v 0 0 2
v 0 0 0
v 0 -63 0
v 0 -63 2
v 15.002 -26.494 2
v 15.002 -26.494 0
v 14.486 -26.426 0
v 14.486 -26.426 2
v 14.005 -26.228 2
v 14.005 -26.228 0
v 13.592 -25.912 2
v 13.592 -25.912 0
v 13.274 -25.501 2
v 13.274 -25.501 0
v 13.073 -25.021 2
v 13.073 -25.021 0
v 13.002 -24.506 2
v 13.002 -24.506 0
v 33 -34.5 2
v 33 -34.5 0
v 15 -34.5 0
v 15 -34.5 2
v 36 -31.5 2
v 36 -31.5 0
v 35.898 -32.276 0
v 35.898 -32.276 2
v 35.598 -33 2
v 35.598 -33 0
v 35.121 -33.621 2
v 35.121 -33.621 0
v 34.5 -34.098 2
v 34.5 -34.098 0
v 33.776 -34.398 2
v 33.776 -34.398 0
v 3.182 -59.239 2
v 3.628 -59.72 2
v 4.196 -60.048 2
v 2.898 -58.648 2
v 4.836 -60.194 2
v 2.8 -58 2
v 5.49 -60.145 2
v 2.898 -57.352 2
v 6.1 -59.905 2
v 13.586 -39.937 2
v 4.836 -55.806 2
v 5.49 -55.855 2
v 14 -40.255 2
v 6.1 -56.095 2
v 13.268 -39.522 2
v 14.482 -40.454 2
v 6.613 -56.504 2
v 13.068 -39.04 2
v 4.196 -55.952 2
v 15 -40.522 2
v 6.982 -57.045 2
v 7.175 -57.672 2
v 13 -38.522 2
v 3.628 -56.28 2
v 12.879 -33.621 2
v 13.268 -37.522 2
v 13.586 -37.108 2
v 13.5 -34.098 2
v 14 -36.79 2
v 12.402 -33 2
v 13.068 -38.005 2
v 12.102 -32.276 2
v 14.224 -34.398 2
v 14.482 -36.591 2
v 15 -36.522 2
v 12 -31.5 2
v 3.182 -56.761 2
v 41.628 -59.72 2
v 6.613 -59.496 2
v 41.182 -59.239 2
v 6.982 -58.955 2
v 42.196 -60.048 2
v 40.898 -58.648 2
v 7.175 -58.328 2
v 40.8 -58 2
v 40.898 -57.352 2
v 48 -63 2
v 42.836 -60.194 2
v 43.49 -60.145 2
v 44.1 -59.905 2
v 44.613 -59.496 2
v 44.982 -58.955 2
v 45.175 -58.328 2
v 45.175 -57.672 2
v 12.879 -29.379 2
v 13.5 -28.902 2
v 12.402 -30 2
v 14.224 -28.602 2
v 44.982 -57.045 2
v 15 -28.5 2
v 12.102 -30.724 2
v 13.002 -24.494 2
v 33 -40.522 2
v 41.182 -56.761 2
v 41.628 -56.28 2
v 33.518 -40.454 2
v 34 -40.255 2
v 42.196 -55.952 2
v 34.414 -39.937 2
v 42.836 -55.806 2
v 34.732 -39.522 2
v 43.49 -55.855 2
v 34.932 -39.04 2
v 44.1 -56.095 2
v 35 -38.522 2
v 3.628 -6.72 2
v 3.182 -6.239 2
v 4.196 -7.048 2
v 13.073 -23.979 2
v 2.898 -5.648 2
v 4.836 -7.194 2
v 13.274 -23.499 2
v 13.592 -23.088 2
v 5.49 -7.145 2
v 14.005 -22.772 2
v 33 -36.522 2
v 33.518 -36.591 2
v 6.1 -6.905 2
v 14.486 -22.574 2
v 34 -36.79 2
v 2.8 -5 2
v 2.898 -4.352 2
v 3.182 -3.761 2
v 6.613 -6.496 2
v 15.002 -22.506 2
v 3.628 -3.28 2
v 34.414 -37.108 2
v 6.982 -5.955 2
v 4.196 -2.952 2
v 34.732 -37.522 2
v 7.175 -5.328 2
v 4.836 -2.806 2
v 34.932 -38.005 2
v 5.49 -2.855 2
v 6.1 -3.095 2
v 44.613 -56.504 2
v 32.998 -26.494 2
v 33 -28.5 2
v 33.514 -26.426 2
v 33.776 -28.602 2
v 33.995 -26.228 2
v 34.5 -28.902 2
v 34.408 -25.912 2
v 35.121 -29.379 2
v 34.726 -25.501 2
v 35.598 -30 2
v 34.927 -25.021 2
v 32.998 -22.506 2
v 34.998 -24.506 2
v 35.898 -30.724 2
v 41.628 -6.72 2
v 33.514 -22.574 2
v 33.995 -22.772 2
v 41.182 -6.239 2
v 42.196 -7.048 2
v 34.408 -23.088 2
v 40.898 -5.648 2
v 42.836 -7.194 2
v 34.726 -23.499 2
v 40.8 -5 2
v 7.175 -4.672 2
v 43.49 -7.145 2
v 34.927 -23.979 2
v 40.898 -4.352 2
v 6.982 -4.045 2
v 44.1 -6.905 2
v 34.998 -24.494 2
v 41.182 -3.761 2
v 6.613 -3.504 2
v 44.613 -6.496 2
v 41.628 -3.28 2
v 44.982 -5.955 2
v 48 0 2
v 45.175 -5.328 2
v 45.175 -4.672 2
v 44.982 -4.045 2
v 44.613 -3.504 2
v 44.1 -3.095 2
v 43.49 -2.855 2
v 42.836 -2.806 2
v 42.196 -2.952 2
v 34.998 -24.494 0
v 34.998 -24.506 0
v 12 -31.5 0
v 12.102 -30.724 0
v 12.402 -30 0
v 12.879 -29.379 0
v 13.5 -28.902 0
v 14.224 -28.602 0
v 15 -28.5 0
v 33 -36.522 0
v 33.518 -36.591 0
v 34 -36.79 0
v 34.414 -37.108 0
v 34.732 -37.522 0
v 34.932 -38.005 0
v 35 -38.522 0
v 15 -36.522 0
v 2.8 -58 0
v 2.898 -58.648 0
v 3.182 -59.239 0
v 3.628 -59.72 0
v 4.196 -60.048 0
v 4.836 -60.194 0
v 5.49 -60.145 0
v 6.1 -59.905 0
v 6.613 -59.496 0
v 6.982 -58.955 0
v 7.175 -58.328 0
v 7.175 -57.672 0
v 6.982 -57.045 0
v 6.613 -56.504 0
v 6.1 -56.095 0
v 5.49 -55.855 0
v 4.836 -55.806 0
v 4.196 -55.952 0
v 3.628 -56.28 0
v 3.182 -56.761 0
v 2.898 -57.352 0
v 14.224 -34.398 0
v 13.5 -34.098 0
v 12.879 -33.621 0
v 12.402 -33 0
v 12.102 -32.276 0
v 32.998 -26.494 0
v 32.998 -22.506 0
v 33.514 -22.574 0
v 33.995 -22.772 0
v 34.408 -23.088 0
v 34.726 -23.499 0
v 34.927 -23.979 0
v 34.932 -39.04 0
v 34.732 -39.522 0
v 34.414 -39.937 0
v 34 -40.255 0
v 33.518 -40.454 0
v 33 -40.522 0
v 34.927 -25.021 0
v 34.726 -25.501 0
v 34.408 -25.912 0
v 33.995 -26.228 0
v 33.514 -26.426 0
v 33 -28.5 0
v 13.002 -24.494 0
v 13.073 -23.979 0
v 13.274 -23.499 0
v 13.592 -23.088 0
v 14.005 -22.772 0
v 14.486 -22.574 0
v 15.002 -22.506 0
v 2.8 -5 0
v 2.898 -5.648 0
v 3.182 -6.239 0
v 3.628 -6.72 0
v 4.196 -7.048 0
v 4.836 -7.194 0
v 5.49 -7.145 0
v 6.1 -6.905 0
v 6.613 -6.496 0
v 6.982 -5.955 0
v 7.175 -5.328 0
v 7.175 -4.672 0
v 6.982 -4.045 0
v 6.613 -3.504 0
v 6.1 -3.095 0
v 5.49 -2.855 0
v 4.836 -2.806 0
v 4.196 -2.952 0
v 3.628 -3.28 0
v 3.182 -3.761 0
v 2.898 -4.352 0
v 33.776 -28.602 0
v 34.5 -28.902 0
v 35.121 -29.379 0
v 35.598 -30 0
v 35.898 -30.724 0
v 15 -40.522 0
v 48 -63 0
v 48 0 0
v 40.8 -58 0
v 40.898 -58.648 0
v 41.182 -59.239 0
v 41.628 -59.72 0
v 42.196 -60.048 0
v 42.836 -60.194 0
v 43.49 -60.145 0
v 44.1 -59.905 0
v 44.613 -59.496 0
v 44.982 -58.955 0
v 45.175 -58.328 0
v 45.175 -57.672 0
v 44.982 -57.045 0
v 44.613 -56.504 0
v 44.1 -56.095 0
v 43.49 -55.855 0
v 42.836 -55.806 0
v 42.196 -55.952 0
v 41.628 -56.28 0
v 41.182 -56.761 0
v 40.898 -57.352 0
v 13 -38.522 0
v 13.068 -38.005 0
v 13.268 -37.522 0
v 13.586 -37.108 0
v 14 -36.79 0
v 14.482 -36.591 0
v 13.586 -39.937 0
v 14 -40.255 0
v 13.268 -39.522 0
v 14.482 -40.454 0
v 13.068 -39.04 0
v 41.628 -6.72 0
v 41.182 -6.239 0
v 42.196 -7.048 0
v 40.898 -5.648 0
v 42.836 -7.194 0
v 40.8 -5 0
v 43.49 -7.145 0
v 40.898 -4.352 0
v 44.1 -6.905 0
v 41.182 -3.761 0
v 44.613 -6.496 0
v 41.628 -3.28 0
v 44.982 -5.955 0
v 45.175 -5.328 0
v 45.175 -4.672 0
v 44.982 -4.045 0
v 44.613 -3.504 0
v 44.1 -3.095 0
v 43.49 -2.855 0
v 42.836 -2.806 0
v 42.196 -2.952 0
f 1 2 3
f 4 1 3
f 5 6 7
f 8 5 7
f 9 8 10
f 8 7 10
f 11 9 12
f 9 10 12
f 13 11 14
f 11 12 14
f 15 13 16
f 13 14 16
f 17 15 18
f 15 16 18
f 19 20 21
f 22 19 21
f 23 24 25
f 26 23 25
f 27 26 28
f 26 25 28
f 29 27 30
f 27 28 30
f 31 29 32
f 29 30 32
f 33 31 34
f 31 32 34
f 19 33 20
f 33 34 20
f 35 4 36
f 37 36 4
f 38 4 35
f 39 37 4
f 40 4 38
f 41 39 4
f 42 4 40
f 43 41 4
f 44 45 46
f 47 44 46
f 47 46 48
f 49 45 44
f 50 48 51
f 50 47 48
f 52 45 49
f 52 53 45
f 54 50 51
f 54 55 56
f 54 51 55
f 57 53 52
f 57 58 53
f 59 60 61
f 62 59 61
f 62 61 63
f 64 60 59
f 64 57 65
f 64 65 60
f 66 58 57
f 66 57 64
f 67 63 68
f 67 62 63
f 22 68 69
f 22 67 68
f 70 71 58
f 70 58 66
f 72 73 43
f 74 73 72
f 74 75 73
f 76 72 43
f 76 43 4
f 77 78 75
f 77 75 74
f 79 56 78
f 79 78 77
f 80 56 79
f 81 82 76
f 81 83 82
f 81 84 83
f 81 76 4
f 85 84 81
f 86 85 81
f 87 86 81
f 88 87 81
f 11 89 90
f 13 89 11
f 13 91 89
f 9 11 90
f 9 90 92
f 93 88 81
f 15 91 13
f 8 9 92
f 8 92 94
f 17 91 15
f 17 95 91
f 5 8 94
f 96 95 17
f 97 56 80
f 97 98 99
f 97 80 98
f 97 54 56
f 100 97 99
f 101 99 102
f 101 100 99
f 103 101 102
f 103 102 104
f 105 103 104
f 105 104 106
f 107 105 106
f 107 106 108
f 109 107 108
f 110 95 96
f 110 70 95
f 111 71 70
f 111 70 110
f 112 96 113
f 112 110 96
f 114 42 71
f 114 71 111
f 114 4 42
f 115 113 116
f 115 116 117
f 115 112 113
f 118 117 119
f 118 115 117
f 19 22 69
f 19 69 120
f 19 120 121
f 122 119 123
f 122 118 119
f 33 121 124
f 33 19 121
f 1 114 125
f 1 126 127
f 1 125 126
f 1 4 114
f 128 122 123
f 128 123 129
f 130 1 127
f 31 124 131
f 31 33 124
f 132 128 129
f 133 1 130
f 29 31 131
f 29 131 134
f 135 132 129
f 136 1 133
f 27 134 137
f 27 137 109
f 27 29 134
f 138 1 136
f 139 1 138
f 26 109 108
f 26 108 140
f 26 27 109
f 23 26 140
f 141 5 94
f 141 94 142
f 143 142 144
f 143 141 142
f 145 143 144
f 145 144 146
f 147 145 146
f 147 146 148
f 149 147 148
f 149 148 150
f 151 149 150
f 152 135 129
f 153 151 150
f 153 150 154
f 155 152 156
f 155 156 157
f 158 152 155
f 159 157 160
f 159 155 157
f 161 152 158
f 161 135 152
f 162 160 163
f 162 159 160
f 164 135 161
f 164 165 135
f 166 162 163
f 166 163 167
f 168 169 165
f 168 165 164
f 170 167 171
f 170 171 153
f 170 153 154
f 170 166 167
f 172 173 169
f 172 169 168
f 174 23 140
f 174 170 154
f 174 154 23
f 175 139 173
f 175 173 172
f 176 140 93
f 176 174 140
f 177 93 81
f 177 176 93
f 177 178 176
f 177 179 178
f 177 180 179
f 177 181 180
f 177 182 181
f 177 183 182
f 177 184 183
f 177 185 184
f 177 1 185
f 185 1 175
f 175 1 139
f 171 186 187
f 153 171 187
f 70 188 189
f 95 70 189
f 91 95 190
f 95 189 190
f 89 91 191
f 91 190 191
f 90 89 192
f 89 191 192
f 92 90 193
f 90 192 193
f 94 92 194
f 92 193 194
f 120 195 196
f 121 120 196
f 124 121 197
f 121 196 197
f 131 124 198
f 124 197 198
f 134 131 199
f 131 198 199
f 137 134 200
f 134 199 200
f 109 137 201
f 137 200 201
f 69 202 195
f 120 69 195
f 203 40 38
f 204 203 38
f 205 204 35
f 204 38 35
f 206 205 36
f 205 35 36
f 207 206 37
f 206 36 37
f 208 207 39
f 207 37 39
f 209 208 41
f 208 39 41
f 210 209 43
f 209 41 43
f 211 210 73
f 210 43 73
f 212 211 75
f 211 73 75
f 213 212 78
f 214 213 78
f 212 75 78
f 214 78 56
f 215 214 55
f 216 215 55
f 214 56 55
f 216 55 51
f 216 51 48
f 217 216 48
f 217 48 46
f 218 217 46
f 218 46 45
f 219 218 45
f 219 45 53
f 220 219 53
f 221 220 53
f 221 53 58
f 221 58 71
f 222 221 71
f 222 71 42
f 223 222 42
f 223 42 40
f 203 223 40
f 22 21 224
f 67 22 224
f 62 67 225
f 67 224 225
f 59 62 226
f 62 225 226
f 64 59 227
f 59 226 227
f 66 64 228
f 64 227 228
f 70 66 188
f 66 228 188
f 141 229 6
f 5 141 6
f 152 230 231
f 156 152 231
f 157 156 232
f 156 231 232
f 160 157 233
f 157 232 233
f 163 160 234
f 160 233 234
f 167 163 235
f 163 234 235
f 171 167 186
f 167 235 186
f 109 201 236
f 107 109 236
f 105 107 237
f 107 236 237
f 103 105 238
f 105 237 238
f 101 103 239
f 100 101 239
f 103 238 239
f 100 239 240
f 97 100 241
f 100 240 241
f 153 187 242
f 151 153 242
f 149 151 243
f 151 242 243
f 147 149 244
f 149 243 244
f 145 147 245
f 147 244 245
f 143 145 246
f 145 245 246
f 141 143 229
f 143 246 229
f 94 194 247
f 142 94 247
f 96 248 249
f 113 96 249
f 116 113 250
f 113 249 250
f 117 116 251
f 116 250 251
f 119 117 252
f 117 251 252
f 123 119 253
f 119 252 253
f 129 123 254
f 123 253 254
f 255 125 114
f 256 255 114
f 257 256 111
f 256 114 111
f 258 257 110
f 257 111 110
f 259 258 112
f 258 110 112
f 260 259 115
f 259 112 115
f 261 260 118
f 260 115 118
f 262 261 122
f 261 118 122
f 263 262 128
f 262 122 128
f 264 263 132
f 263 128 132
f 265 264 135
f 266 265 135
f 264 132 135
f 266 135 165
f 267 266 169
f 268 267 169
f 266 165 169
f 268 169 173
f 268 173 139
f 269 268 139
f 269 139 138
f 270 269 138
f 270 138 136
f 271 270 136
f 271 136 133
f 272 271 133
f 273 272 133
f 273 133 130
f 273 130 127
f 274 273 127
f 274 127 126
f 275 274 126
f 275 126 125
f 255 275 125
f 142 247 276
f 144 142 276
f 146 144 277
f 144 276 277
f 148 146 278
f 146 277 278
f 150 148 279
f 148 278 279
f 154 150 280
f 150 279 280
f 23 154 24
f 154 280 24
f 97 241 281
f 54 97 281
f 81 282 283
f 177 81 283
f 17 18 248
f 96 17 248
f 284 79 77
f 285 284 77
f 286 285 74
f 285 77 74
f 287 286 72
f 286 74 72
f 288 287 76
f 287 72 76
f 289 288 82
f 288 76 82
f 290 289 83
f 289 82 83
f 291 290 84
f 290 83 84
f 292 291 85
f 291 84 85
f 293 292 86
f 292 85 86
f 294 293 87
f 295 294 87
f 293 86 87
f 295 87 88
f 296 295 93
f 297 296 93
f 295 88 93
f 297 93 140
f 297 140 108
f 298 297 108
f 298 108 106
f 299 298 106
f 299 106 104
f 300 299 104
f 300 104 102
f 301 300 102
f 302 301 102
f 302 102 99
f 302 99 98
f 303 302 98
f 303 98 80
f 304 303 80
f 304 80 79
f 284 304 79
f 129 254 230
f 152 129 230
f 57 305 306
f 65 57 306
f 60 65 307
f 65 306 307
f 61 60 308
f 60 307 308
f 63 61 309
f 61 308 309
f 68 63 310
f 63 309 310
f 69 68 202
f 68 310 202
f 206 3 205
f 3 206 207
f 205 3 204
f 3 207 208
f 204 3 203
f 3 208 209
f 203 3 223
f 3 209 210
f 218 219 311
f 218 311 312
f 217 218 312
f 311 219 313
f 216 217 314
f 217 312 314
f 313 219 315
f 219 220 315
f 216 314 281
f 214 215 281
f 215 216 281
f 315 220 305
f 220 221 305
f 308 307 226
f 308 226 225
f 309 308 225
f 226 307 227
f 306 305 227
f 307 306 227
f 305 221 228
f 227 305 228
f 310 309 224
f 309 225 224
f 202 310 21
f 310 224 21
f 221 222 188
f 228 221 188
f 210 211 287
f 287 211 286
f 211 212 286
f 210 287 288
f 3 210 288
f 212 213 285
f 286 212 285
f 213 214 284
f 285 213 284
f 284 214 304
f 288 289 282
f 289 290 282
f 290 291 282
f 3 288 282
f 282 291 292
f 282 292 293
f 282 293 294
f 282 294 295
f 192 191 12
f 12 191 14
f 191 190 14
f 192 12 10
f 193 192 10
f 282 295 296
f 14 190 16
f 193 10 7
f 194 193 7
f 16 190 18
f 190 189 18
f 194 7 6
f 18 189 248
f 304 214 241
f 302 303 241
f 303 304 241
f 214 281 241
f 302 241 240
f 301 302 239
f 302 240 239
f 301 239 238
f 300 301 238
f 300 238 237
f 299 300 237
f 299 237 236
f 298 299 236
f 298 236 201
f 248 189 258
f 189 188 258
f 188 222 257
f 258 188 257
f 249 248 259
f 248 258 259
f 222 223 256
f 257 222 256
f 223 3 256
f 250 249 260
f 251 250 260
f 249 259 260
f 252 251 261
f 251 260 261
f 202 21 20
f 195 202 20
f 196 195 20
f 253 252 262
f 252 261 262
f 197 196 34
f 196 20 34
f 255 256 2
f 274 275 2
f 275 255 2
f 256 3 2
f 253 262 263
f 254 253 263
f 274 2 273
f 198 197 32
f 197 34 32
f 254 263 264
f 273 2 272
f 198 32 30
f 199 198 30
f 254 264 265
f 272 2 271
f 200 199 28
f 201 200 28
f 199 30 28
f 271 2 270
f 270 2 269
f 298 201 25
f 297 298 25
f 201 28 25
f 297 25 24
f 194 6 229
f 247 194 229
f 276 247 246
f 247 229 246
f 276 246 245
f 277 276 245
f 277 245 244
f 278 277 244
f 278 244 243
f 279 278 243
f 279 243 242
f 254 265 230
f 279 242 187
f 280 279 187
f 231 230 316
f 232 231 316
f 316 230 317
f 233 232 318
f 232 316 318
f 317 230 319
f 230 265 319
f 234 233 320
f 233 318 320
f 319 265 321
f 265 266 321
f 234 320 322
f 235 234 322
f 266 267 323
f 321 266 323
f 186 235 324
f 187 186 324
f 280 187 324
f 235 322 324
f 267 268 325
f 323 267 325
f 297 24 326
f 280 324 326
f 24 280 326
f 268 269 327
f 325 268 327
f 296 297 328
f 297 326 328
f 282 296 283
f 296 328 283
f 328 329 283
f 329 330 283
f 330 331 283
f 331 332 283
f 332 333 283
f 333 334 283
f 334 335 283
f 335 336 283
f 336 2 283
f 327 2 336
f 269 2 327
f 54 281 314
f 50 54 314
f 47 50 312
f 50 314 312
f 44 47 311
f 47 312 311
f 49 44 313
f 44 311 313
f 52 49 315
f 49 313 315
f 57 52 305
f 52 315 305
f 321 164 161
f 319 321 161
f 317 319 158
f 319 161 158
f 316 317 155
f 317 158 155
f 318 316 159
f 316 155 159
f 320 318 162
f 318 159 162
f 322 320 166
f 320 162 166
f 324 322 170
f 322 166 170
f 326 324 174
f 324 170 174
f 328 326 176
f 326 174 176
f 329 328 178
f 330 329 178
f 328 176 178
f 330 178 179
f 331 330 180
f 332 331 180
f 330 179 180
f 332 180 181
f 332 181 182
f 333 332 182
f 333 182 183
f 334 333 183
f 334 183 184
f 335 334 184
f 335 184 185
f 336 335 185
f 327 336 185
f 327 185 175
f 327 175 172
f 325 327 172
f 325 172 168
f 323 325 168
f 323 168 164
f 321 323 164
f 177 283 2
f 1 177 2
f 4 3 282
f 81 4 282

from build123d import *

# Parameters (mm, degrees)
F1_DEPTH = 2
F2_D     = 4.4
F2_DEPTH = 5
F2_TIP   = 1.3218933619


# Not quite as in the source:
# - ends of sketch curves that miss each other by under 0.0002 mm in the source are joined


with BuildPart() as f1:
    # F0 (on Top) → F1 (new body)
    with BuildSketch(Plane.XY):
        with BuildLine():
            Line((24, 0), (0, 0))
            Line((0, 0), (0, -31.5))
            Line((0, -31.5), (12, -31.5))
            ThreePointArc((12, -31.5), (12.8786796564, -29.3786796564), (15, -28.5))
            Line((15, -28.5), (24, -28.5))
            Line((24, -28.5), (24, -26.4939))
            Line((24, -26.4939), (15.0018, -26.4939))
            ThreePointArc((15.0018, -26.4939), (13.5919063065, -25.9124202759), (13.001837209, -24.506099773))
            Line((13.001837209, -24.506099773), (13.0018, -24.4939))
            ThreePointArc((13.0018, -24.4939), (13.5919063065, -23.0875797241), (15.0018, -22.5061))
            Line((15.0018, -22.5061), (24, -22.5061))
            Line((24, -22.5061), (24, 0))
        make_face()
        with BuildLine():
            Line((48, 0), (24, 0))
            Line((24, 0), (24, -22.5061))
            Line((24, -22.5061), (32.9982, -22.5061))
            ThreePointArc((32.9982, -22.5061), (34.4080936935, -23.0875797241), (34.998162791, -24.493900227))
            Line((34.998162791, -24.493900227), (34.9982, -24.5061))
            ThreePointArc((34.9982, -24.5061), (34.4080936935, -25.9124202759), (32.9982, -26.4939))
            Line((32.9982, -26.4939), (24, -26.4939))
            Line((24, -26.4939), (24, -28.5))
            Line((24, -28.5), (33, -28.5))
            ThreePointArc((33, -28.5), (35.1213203436, -29.3786796564), (36, -31.5))
            Line((36, -31.5), (48, -31.5))
            Line((48, -31.5), (48, 0))
        make_face()
        with BuildLine():
            Line((12, -31.5), (0, -31.5))
            Line((0, -31.5), (0, -63))
            Line((0, -63), (24, -63))
            Line((24, -63), (24, -40.5224670172))
            Line((24, -40.5224670172), (15, -40.5224670172))
            ThreePointArc((15, -40.5224670172), (13.5857864376, -39.9366805795), (13, -38.5224670172))
            ThreePointArc((13, -38.5224670172), (13.5857864376, -37.1082534548), (15, -36.5224670172))
            Line((15, -36.5224670172), (24, -36.5224670172))
            Line((24, -36.5224670172), (24, -34.5))
            Line((24, -34.5), (15, -34.5))
            ThreePointArc((15, -34.5), (12.8786796564, -33.6213203436), (12, -31.5))
        make_face()
        with BuildLine():
            Line((48, -63), (48, -31.5))
            Line((48, -31.5), (36, -31.5))
            ThreePointArc((36, -31.5), (35.1213203436, -33.6213203436), (33, -34.5))
            Line((33, -34.5), (24, -34.5))
            Line((24, -34.5), (24, -36.5224670172))
            Line((24, -36.5224670172), (33, -36.5224670172))
            ThreePointArc((33, -36.5224670172), (34.4142135624, -37.1082534548), (35, -38.5224670172))
            ThreePointArc((35, -38.5224670172), (34.4142135624, -39.9366805795), (33, -40.5224670172))
            Line((33, -40.5224670172), (24, -40.5224670172))
            Line((24, -40.5224670172), (24, -63))
            Line((24, -63), (48, -63))
        make_face()
    extrude(amount=F1_DEPTH)

    # F2
    with Locations(Plane(origin=(0, 0, 0), x_dir=(1, 0, 0), z_dir=(0, 0, -1))):
        with Locations((5, 5), (43, 5), (43, 58), (5, 58)):
            Hole(F2_D / 2, depth=F2_DEPTH)
            with Locations((0, 0, -(F2_DEPTH + F2_TIP / 2))):  # 118° drill point
                Cone(0, F2_D / 2, F2_TIP, mode=Mode.SUBTRACT)


solid = f1.part
